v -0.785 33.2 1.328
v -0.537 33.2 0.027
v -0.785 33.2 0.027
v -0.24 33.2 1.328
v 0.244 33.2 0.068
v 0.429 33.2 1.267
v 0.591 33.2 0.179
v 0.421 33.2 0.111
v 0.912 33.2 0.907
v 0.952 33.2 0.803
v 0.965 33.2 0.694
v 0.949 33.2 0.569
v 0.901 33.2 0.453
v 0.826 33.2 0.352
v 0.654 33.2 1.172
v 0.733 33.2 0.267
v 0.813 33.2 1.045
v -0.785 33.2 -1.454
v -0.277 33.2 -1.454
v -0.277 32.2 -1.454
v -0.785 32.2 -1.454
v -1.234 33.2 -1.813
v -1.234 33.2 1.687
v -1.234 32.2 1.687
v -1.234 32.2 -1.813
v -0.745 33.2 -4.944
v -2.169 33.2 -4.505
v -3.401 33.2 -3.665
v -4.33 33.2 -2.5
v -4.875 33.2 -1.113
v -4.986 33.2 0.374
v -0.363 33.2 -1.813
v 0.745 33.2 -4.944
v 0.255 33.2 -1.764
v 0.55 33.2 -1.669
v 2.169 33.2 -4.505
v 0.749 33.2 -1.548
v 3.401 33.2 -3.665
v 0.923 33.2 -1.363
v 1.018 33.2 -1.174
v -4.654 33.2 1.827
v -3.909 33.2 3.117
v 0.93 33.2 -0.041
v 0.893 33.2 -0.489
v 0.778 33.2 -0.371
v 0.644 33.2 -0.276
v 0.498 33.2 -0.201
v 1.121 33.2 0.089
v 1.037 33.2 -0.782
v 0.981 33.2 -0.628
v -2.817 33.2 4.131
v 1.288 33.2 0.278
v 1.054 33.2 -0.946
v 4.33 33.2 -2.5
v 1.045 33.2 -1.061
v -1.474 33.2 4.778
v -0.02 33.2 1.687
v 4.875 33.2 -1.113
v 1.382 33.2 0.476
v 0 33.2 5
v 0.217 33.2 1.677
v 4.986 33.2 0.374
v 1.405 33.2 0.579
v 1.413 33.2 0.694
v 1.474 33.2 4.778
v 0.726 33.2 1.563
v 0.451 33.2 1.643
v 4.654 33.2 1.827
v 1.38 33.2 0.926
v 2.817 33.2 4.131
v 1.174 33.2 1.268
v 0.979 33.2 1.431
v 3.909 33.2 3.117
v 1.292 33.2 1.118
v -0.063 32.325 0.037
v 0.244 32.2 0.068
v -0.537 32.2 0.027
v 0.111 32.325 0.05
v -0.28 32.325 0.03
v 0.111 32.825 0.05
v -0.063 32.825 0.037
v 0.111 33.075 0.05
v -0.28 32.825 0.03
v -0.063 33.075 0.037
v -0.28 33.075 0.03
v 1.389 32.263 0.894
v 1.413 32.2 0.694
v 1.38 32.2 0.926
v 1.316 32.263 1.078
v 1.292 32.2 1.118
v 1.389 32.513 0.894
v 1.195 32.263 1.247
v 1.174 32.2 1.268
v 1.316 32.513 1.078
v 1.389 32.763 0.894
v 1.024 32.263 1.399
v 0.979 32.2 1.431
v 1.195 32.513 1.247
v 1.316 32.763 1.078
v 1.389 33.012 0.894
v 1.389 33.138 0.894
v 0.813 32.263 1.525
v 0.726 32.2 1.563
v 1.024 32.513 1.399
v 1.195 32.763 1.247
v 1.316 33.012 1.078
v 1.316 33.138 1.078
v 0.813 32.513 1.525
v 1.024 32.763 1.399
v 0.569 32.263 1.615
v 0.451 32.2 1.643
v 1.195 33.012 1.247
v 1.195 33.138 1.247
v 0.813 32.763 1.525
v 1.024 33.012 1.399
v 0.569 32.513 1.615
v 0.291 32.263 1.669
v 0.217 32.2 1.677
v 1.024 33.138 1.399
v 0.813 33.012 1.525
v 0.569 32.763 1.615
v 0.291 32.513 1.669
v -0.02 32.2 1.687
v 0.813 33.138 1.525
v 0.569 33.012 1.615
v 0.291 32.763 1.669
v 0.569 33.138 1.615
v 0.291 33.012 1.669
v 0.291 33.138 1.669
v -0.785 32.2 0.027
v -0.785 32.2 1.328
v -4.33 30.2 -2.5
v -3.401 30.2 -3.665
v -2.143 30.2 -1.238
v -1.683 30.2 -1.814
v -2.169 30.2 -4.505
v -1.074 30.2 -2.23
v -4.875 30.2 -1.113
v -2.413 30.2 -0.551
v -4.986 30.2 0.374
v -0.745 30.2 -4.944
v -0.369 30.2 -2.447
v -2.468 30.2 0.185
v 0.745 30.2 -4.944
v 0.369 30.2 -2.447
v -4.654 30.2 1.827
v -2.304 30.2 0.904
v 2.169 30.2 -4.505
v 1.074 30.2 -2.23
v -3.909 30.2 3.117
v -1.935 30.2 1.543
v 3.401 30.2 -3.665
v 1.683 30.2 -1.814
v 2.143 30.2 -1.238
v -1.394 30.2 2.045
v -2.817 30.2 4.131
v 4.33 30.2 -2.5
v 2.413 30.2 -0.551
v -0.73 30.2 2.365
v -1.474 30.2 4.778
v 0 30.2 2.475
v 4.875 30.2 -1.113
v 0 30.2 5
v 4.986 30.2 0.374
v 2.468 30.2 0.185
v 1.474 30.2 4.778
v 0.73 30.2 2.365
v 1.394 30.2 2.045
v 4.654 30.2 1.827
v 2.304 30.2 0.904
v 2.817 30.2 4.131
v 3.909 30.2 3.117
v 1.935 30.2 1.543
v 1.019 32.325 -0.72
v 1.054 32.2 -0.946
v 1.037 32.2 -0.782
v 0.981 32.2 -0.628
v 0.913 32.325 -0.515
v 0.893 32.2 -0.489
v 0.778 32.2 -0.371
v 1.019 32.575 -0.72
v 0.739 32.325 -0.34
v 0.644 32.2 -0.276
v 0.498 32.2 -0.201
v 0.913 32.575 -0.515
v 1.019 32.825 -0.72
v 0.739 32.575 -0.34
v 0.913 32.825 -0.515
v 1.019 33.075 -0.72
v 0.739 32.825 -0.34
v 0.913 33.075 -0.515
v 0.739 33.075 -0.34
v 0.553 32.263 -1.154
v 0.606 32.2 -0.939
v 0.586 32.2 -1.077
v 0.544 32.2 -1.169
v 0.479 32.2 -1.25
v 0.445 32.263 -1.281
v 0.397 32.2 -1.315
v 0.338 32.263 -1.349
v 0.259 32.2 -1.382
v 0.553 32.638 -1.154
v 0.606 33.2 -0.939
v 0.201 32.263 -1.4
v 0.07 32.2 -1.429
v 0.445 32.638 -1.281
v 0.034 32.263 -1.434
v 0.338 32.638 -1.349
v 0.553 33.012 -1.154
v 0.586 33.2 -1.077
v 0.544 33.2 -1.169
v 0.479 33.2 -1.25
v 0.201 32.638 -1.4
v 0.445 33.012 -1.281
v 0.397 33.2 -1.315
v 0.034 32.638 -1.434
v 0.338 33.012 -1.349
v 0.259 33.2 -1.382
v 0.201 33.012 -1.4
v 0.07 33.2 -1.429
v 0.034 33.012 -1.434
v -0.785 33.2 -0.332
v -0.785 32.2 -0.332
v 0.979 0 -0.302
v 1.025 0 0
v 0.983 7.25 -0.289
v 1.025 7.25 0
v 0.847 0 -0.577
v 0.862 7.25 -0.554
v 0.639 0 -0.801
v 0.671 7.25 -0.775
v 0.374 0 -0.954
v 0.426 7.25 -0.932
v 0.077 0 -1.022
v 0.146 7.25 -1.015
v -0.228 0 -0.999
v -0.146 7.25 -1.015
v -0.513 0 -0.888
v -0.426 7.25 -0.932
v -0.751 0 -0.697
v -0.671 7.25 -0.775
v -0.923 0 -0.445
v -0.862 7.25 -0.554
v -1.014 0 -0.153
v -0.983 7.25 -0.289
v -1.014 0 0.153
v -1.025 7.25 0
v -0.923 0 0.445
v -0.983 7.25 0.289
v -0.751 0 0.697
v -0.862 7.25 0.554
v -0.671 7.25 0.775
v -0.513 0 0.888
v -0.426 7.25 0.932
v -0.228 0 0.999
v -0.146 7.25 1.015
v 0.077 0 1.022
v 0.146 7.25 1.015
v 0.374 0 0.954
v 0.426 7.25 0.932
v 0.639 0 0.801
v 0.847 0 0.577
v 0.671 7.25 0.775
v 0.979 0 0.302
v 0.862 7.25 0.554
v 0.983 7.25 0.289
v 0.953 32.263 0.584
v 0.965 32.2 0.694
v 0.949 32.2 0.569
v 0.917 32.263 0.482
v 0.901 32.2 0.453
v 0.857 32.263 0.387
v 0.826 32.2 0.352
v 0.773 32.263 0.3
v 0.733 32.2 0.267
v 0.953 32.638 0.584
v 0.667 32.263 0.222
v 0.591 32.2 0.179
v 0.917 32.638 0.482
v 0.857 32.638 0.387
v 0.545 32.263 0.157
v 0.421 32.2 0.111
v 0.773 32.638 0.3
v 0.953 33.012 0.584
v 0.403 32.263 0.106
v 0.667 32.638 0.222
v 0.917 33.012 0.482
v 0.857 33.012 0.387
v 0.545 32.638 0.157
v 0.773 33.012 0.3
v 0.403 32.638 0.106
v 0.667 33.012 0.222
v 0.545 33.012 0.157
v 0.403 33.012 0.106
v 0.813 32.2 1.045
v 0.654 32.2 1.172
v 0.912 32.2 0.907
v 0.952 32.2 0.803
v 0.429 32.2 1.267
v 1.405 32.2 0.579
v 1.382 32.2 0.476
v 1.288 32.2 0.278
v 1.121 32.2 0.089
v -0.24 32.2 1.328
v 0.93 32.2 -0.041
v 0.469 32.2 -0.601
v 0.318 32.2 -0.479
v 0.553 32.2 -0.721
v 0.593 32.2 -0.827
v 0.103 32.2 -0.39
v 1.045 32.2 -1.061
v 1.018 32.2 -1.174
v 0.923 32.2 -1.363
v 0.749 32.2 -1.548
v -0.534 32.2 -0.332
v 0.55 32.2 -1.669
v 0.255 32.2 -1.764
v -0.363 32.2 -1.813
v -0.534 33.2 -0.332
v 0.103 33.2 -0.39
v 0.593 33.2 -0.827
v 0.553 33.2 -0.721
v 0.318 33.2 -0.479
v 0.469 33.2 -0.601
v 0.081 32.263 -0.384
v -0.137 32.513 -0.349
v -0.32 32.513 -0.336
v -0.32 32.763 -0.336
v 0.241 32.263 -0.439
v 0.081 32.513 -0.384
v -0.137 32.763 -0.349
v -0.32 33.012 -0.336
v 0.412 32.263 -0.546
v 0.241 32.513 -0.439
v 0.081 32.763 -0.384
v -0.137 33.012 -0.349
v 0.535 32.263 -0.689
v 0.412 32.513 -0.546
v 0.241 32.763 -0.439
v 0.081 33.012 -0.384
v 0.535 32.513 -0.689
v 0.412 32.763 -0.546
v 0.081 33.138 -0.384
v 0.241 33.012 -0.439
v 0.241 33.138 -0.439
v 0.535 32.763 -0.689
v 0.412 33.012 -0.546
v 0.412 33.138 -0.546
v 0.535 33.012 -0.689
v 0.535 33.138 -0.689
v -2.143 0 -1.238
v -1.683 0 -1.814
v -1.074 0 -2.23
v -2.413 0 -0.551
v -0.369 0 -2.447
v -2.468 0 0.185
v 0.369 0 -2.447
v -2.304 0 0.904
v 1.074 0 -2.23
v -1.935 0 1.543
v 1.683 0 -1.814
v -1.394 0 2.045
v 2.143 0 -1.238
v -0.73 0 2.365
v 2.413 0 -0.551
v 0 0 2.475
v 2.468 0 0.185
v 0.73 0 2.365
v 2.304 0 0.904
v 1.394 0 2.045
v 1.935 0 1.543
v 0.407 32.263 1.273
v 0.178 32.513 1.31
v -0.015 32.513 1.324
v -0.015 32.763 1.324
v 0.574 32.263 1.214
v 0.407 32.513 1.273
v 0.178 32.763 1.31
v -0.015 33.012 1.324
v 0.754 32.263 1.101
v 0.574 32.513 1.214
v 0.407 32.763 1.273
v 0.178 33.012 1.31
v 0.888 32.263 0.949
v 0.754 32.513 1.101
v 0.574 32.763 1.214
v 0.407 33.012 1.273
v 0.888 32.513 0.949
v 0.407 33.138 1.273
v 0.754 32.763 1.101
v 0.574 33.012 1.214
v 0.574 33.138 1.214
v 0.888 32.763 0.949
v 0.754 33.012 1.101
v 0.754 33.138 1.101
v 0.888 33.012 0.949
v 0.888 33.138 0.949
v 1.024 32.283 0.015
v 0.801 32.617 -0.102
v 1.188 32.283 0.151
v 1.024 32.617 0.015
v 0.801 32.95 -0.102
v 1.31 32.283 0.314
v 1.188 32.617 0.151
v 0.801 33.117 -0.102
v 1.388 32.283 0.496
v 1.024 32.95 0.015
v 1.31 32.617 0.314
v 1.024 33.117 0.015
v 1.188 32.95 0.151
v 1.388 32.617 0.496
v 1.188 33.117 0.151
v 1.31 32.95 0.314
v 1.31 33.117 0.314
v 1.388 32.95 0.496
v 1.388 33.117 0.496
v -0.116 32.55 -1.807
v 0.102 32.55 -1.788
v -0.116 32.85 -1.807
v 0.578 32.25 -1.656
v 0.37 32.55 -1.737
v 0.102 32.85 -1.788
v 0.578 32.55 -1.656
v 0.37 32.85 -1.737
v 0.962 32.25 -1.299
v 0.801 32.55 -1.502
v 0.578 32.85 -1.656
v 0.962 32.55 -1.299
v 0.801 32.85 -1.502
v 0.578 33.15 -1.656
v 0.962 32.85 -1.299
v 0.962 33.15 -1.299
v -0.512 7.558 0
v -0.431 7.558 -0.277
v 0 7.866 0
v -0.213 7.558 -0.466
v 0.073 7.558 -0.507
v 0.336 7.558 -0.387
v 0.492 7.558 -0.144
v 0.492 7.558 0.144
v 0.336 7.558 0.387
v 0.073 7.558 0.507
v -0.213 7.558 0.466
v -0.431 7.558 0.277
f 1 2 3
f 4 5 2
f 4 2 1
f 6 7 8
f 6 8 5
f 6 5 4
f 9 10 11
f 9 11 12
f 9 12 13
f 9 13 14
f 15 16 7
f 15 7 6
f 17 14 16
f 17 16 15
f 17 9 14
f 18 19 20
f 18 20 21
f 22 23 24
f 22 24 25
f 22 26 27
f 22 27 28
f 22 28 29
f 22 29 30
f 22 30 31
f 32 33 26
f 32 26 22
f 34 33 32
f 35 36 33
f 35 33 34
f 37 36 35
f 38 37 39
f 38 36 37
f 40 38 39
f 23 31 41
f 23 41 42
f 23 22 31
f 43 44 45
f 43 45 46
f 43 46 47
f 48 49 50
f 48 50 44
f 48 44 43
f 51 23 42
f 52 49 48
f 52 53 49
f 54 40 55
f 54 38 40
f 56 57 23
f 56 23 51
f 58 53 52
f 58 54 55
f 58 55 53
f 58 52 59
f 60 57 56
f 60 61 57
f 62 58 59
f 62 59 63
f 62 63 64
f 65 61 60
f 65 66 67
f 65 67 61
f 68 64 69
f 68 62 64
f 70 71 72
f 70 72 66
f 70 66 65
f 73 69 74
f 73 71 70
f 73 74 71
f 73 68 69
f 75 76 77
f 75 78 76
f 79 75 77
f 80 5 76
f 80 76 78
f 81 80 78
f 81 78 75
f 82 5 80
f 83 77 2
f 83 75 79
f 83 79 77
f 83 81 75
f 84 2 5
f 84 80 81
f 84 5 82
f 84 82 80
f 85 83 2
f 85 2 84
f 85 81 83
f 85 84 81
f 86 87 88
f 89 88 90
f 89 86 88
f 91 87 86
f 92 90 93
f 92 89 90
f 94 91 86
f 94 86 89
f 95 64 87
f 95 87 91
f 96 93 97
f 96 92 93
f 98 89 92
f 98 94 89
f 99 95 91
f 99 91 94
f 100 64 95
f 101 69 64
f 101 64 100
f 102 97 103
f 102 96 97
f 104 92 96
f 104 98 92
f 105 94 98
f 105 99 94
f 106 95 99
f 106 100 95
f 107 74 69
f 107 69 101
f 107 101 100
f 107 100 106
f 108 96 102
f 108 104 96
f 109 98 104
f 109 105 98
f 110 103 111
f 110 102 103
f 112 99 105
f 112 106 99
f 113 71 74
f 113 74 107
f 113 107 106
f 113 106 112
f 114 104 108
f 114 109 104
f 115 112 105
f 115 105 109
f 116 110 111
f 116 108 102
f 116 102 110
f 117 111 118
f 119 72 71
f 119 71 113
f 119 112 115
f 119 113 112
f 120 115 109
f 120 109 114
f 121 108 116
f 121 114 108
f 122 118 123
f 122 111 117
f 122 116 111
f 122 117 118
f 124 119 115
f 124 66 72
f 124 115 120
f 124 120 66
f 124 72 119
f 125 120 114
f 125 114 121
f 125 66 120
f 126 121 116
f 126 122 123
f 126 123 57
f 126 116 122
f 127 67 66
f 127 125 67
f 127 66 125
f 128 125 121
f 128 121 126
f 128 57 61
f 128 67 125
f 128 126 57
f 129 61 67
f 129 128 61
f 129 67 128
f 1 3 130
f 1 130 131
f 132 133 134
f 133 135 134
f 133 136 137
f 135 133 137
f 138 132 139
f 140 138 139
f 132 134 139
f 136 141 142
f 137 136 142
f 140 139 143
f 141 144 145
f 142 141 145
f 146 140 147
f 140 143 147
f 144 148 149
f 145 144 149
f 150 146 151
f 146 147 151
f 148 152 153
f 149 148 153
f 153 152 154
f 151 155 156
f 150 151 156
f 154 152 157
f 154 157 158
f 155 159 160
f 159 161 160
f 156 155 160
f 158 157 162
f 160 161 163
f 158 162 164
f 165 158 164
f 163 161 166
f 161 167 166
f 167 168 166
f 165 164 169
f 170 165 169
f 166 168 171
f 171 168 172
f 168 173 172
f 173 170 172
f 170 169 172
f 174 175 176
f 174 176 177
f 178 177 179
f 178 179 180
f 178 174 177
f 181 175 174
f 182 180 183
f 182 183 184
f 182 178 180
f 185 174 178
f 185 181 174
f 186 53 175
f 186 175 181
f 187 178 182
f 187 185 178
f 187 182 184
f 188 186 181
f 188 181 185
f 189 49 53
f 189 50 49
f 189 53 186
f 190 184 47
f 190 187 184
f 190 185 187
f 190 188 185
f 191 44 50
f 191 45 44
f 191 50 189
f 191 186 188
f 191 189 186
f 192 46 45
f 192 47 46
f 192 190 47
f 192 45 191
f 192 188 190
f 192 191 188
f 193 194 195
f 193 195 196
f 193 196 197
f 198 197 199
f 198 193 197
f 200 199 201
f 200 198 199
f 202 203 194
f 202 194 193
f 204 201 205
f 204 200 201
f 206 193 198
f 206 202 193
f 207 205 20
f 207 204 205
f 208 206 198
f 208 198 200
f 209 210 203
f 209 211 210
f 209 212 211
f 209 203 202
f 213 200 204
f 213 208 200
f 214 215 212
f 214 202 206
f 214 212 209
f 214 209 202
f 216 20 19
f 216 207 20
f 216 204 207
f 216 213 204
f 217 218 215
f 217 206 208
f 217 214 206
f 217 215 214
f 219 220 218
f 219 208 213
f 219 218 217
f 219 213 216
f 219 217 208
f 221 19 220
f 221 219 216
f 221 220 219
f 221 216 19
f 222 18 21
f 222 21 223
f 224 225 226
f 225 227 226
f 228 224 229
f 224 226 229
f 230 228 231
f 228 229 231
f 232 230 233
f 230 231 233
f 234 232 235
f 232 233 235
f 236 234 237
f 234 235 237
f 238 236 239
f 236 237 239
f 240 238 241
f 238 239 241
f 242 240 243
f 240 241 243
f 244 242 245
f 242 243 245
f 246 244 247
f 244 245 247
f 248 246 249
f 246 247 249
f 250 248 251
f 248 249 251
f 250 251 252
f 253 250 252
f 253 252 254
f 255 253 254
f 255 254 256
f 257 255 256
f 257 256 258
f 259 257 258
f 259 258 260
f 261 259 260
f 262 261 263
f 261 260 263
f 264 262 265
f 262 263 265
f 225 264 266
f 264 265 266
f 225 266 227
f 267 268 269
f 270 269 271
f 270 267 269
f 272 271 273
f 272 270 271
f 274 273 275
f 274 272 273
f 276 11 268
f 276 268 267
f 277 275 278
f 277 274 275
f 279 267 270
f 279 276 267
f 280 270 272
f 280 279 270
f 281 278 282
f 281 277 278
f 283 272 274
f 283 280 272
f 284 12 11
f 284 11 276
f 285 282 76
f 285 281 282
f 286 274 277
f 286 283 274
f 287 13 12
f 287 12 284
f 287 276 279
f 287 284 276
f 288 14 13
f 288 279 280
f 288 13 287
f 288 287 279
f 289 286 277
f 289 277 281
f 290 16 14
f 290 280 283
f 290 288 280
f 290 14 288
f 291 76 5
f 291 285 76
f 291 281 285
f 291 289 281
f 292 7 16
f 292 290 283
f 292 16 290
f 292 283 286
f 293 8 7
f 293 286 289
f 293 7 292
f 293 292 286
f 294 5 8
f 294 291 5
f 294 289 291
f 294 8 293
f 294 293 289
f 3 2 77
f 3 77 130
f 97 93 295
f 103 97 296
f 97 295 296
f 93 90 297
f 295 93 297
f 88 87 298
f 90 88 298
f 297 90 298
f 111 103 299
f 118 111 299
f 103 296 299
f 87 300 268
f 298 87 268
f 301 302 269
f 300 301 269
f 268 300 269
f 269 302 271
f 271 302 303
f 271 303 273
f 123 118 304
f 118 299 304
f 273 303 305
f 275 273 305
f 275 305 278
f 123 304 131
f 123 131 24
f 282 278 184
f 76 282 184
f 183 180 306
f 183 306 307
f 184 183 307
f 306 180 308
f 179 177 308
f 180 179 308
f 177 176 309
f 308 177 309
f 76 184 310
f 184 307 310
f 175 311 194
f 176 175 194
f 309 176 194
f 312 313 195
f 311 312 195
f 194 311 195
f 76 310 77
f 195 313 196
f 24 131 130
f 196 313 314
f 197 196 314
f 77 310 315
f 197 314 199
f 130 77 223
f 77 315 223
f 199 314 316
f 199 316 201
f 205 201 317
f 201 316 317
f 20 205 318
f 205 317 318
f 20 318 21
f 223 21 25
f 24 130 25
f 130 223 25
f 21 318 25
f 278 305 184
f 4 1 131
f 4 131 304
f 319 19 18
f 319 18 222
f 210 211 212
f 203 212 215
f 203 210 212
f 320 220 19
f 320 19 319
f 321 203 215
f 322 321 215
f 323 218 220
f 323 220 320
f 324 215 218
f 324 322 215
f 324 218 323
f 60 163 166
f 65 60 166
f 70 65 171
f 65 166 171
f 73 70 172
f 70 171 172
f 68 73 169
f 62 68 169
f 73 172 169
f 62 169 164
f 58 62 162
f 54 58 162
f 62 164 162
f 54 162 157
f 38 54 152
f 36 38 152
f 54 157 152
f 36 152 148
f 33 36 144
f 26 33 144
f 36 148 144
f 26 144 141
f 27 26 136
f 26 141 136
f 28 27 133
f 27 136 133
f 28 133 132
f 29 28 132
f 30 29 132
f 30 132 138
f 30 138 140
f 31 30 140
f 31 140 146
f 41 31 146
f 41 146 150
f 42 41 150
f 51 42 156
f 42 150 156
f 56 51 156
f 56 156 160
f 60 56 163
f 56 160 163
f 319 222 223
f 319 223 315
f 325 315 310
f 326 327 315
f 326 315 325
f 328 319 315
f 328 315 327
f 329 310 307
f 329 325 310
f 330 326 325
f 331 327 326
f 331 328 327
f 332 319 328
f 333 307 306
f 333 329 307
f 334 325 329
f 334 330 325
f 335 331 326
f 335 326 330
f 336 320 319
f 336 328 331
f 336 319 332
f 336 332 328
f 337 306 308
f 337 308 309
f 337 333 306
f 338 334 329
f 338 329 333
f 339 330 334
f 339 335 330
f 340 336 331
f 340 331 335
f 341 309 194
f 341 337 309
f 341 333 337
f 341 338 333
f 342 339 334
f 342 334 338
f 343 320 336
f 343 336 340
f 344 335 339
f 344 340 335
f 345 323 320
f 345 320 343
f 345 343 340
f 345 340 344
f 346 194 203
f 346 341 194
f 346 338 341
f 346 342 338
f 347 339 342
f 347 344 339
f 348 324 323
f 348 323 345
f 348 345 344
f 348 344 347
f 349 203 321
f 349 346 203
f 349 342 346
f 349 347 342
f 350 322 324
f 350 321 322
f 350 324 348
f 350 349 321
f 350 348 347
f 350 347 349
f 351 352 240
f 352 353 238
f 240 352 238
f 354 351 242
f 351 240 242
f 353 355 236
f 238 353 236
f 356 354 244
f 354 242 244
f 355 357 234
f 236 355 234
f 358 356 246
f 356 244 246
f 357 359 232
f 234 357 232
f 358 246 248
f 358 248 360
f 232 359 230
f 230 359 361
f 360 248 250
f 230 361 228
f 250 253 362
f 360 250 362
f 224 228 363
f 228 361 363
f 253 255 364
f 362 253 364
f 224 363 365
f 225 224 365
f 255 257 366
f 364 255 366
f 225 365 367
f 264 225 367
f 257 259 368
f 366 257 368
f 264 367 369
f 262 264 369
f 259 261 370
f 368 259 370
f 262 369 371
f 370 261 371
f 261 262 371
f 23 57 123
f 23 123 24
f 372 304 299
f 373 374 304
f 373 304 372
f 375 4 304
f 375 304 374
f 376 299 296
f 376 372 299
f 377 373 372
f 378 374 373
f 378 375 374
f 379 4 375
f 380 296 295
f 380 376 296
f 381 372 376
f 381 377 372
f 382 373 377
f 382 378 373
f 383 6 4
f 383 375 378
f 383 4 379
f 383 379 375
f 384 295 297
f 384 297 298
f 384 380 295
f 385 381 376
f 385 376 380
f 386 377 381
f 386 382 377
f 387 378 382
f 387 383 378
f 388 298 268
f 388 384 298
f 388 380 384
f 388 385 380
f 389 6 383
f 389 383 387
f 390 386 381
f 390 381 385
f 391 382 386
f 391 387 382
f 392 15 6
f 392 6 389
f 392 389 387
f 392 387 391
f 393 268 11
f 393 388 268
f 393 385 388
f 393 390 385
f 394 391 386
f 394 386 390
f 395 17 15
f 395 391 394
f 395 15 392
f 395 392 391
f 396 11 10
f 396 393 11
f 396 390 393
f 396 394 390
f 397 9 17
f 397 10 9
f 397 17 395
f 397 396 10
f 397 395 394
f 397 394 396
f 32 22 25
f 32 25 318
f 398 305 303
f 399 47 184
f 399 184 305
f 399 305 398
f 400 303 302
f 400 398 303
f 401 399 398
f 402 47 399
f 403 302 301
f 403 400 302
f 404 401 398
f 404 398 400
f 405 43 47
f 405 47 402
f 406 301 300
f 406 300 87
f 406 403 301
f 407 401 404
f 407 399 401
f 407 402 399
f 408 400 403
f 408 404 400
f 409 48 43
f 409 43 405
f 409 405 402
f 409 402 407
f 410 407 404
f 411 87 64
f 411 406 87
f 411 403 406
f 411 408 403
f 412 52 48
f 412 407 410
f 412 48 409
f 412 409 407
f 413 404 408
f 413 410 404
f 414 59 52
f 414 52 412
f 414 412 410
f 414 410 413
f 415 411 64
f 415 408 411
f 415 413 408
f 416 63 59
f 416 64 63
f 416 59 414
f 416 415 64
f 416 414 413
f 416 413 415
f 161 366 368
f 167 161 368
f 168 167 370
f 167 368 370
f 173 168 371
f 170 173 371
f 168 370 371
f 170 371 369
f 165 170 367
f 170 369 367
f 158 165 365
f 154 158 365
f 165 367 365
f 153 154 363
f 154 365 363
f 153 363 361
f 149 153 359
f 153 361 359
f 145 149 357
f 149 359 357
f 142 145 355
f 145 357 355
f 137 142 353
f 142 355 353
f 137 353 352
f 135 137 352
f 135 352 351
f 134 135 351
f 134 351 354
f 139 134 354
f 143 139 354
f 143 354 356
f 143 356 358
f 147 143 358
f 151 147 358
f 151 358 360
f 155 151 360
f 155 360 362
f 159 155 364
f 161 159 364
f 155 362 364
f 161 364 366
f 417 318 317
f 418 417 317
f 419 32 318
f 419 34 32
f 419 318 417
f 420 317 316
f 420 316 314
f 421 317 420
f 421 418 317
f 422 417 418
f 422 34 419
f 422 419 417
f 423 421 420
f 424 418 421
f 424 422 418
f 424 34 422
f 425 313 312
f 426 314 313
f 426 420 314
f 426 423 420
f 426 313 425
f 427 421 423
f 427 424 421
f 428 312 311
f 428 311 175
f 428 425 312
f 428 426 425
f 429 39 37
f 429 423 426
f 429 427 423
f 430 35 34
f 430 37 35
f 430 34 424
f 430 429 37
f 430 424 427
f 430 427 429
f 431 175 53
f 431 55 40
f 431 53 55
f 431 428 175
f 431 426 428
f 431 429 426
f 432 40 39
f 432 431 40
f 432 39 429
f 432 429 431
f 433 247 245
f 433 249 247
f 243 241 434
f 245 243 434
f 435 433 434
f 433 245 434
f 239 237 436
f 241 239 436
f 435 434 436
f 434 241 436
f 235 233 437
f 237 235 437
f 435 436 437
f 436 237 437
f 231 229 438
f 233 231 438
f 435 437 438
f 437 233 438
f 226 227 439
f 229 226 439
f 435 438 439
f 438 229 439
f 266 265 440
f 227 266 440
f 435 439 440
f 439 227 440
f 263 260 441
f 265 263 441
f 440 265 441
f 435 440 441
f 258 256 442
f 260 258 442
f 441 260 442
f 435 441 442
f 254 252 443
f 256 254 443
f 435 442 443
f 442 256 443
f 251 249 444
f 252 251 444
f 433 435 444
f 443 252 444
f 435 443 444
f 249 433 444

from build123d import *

# Parameters (mm, degrees)
SKETCH1_R                    = 2.475
BOSS_EXTRUDE1_DEPTH          = 30.2
SKETCH2_R                    = 5
BOSS_EXTRUDE2_DEPTH          = 3
M2_5X0_45_TAPPED_HOLE2_D     = 2.05
M2_5X0_45_TAPPED_HOLE2_DEPTH = 7.25
M2_5X0_45_TAPPED_HOLE2_TIP   = 0.615882135
CUT_EXTRUDE1_DEPTH           = 1


with BuildPart() as part:
    # Sketch1 → Boss-Extrude1 (new body)
    with BuildSketch(Plane(origin=(0, 0, 0), x_dir=(1, 0, 0), z_dir=(0, 1, 0))):
        with Locations(Location((0, 0, 0), (0, 0, 270))):
            Circle(SKETCH1_R)
    extrude(amount=BOSS_EXTRUDE1_DEPTH)

    # Sketch2 → Boss-Extrude2 (add)
    with BuildSketch(Plane(origin=(0, 30.2, 0), x_dir=(1, 0, 0), z_dir=(0, 1, 0))):
        with Locations(Location((0, 0, 0), (0, 0, 270))):
            Circle(SKETCH2_R)
    extrude(amount=BOSS_EXTRUDE2_DEPTH)

    # M2.5x0.45 Tapped Hole2
    with Locations(Plane(origin=(0, 0, 0), x_dir=(-1, 0, 0), z_dir=(0, -1, 0))):
        with Locations((0, 0)):
            Hole(M2_5X0_45_TAPPED_HOLE2_D / 2, depth=M2_5X0_45_TAPPED_HOLE2_DEPTH)
            with Locations((0, 0, -(M2_5X0_45_TAPPED_HOLE2_DEPTH + M2_5X0_45_TAPPED_HOLE2_TIP / 2))):  # 118° drill point
                Cone(0, M2_5X0_45_TAPPED_HOLE2_D / 2, M2_5X0_45_TAPPED_HOLE2_TIP, mode=Mode.SUBTRACT)

    # Sketch15 → Cut-Extrude1 (cut)
    with BuildSketch(Plane(origin=(0, 33.2, 0), x_dir=(1, 0, 0), z_dir=(0, 1, 0))):
        with BuildLine():
            Line((-1.233974359, 1.812951114), (-0.36318109, 1.812951114))
            add(Edge.make_bspline(
                [(-0.36318109, 1.812951114), (-0.320639792, 1.81277482), (-0.238097313, 1.812432758), (-0.117944897, 1.807143974), (-0.005417149, 1.799981229), (0.099544539, 1.788516219), (0.196648731, 1.774795951), (0.286334292, 1.758075463), (0.368386787, 1.738061375), (0.466181104, 1.706551189), (0.577385314, 1.659544464), (0.69854813, 1.590428983), (0.803039094, 1.505102662), (0.877878706, 1.423867273), (0.929466312, 1.354120247), (0.962333975, 1.29956986), (0.991258246, 1.244562421), (1.014994605, 1.187686093), (1.03202411, 1.128998157), (1.044819465, 1.069026747), (1.052748306, 1.007805904), (1.053904509, 0.96648646), (1.054487179, 0.945663454)],
                knots=[0, 0, 0, 0, 1.369395837, 2.657025819, 3.871165245, 4.998641136, 6.055205263, 7.027626947, 7.93453697, 8.772070297, 10.33297941, 11.813084282, 13.246620381, 14.657649904, 15.357394331, 16.036113692, 16.705765142, 17.356858567, 18.01624541, 18.669941831, 19.32971487, 20, 20, 20, 20], degree=3))
            add(Edge.make_bspline(
                [(1.054487179, 0.945663454), (1.052654691, 0.906966077), (1.049036329, 0.83055573), (1.022472193, 0.718394704), (0.976599056, 0.612617091), (0.914657599, 0.512329552), (0.835047458, 0.419836309), (0.738822803, 0.335989818), (0.625254813, 0.261839362), (0.541323489, 0.221824121), (0.497796474, 0.201072108)],
                knots=[0, 0, 0, 0, 0.940699359, 1.857468692, 2.784365282, 3.733848908, 4.713424377, 5.740520916, 6.828227955, 8, 8, 8, 8], degree=3))
            add(Edge.make_bspline(
                [(0.497796474, 0.201072108), (0.551768458, 0.185885857), (0.654151048, 0.157078178), (0.796065663, 0.105389985), (0.918408451, 0.049772841), (1.022231895, -0.011295733), (1.110522963, -0.078039162), (1.189022557, -0.14879913), (1.255397333, -0.227838547), (1.312111012, -0.312229672), (1.356926733, -0.401765633), (1.389714175, -0.495676987), (1.410030166, -0.593359641), (1.412313767, -0.660043172), (1.413461538, -0.693559303)],
                knots=[0, 0, 0, 0, 1.455388961, 2.760811819, 3.917406684, 4.940403342, 5.880962759, 6.78714742, 7.678335857, 8.55349333, 9.421892728, 10.270128957, 11.13054119, 12, 12, 12, 12], degree=3))
            add(Edge.make_bspline(
                [(1.413461538, -0.693559303), (1.412242032, -0.727766419), (1.409835393, -0.795272532), (1.390894564, -0.894196499), (1.36088474, -0.989122853), (1.317295116, -1.079552584), (1.262055501, -1.166202634), (1.195329189, -1.249512571), (1.114856404, -1.327158434), (1.024464106, -1.401484855), (0.922871793, -1.468011987), (0.813113979, -1.527831578), (0.693968983, -1.576136638), (0.567314142, -1.617190861), (0.43218615, -1.648584594), (0.288953701, -1.670407593), (0.137495898, -1.685226372), (0.033691266, -1.686430398), (-0.01963141, -1.687048886)],
                knots=[0, 0, 0, 0, 0.84636283, 1.670256716, 2.484525081, 3.304937408, 4.147653302, 5.024173689, 5.940669469, 6.911204725, 7.917390592, 8.942545822, 10.000945251, 11.095161556, 12.236182265, 13.430964445, 14.680330095, 16, 16, 16, 16], degree=3))
            Line((-0.01963141, -1.687048886), (-1.233974359, -1.687048886))
            Line((-1.233974359, -1.687048886), (-1.233974359, 1.812951114))
        make_face()
        with BuildLine():
            Line((-0.78525641, 1.453976755), (-0.78525641, 0.332181883))
            Line((-0.78525641, 0.332181883), (-0.534254808, 0.332181883))
            add(Edge.make_bspline(
                [(-0.534254808, 0.332181883), (-0.497329505, 0.332581376), (-0.426039685, 0.333352655), (-0.322906469, 0.335567073), (-0.227348255, 0.341740614), (-0.139336138, 0.348009662), (-0.058900721, 0.357993139), (0.013762316, 0.370008339), (0.079332379, 0.382624131), (0.154899034, 0.404259896), (0.240417473, 0.435647338), (0.332105819, 0.484931753), (0.412678402, 0.543856716), (0.481314845, 0.611394969), (0.536663448, 0.686573824), (0.57599864, 0.767139114), (0.601758026, 0.851788302), (0.604422567, 0.909955529), (0.605769231, 0.939353358)],
                knots=[0, 0, 0, 0, 1.228781612, 2.372346689, 3.431775579, 4.414692591, 5.307870858, 6.127357932, 6.865508947, 7.527788984, 8.741043829, 9.889226724, 10.97954299, 12.051822853, 13.081523397, 14.06922767, 15.024183967, 16, 16, 16, 16], degree=3))
            add(Edge.make_bspline(
                [(0.605769231, 0.939353358), (0.605069578, 0.958793616), (0.603694839, 0.996991554), (0.593661455, 1.052580133), (0.577534344, 1.105242414), (0.554328035, 1.154703777), (0.5237272, 1.200237525), (0.487498602, 1.243054995), (0.444430933, 1.282429509), (0.394180863, 1.318194021), (0.336986398, 1.350636833), (0.272169726, 1.378747532), (0.199333131, 1.401261658), (0.119403459, 1.421298849), (0.031136116, 1.435282122), (-0.064476809, 1.446778275), (-0.168191884, 1.452820409), (-0.239777112, 1.453581571), (-0.276943109, 1.453976755)],
                knots=[0, 0, 0, 0, 0.81361945, 1.598671385, 2.356922644, 3.11416307, 3.876758201, 4.647284559, 5.457543271, 6.312925357, 7.224393372, 8.206010094, 9.264318981, 10.412951858, 11.653205513, 13.002848701, 14.443923124, 16, 16, 16, 16], degree=3))
            Line((-0.276943109, 1.453976755), (-0.78525641, 1.453976755))
        make_face(mode=Mode.SUBTRACT)
        with BuildLine():
            Line((-0.78525641, -0.026792476), (-0.78525641, -1.328074527))
            Line((-0.78525641, -1.328074527), (-0.239783654, -1.328074527))
            add(Edge.make_bspline(
                [(-0.239783654, -1.328074527), (-0.200987304, -1.327690356), (-0.125956017, -1.326947378), (-0.017469258, -1.324522225), (0.083100767, -1.3191041), (0.17537521, -1.31032603), (0.259927106, -1.301113071), (0.336165219, -1.288439684), (0.40454898, -1.273893981), (0.483978905, -1.251863739), (0.573325451, -1.217636717), (0.669712619, -1.165152633), (0.75566181, -1.103329109), (0.828970911, -1.03131561), (0.888686141, -0.952756222), (0.932418672, -0.869523141), (0.96005753, -0.782699587), (0.963185334, -0.723201137), (0.96474359, -0.693559303)],
                knots=[0, 0, 0, 0, 1.229962997, 2.378721407, 3.439847587, 4.421852365, 5.31694785, 6.13545284, 6.87076298, 7.532272478, 8.747192924, 9.894301625, 11.002789606, 12.092524487, 13.140140875, 14.117719788, 15.062257293, 16, 16, 16, 16], degree=3))
            add(Edge.make_bspline(
                [(0.96474359, -0.693559303), (0.964248878, -0.675063946), (0.963265781, -0.638309743), (0.954024974, -0.584078298), (0.937930082, -0.532037628), (0.91842641, -0.48095885), (0.889767871, -0.433133136), (0.857272369, -0.385843714), (0.817562099, -0.341127783), (0.772510175, -0.298244001), (0.722331889, -0.257897223), (0.667454581, -0.22063784), (0.608022441, -0.186922123), (0.544201506, -0.155945118), (0.47544777, -0.128829439), (0.402387834, -0.105003984), (0.324849413, -0.084628111), (0.271392504, -0.073739953), (0.243990385, -0.068158662)],
                knots=[0, 0, 0, 0, 0.855972342, 1.700998913, 2.536409134, 3.376362511, 4.224639329, 5.110263021, 6.030513101, 6.987259223, 7.987740375, 9.008211689, 10.055134299, 11.148935388, 12.290305944, 13.47432859, 14.705335734, 16, 16, 16, 16], degree=3))
            add(Edge.make_bspline(
                [(0.243990385, -0.068158662), (0.223684811, -0.064699565), (0.179484109, -0.057169883), (0.107606648, -0.049320661), (0.025555986, -0.042263275), (-0.066812959, -0.037035463), (-0.169619858, -0.031670757), (-0.283016111, -0.029566976), (-0.406639983, -0.027064663), (-0.492419411, -0.02688564), (-0.537059295, -0.026792476)],
                knots=[0, 0, 0, 0, 0.631265822, 1.374124787, 2.215341576, 3.155543556, 4.209810819, 5.370695037, 6.631701453, 8, 8, 8, 8], degree=3))
            Line((-0.537059295, -0.026792476), (-0.78525641, -0.026792476))
        make_face(mode=Mode.SUBTRACT)
    extrude(amount=-CUT_EXTRUDE1_DEPTH, mode=Mode.SUBTRACT)


solid = part.part
